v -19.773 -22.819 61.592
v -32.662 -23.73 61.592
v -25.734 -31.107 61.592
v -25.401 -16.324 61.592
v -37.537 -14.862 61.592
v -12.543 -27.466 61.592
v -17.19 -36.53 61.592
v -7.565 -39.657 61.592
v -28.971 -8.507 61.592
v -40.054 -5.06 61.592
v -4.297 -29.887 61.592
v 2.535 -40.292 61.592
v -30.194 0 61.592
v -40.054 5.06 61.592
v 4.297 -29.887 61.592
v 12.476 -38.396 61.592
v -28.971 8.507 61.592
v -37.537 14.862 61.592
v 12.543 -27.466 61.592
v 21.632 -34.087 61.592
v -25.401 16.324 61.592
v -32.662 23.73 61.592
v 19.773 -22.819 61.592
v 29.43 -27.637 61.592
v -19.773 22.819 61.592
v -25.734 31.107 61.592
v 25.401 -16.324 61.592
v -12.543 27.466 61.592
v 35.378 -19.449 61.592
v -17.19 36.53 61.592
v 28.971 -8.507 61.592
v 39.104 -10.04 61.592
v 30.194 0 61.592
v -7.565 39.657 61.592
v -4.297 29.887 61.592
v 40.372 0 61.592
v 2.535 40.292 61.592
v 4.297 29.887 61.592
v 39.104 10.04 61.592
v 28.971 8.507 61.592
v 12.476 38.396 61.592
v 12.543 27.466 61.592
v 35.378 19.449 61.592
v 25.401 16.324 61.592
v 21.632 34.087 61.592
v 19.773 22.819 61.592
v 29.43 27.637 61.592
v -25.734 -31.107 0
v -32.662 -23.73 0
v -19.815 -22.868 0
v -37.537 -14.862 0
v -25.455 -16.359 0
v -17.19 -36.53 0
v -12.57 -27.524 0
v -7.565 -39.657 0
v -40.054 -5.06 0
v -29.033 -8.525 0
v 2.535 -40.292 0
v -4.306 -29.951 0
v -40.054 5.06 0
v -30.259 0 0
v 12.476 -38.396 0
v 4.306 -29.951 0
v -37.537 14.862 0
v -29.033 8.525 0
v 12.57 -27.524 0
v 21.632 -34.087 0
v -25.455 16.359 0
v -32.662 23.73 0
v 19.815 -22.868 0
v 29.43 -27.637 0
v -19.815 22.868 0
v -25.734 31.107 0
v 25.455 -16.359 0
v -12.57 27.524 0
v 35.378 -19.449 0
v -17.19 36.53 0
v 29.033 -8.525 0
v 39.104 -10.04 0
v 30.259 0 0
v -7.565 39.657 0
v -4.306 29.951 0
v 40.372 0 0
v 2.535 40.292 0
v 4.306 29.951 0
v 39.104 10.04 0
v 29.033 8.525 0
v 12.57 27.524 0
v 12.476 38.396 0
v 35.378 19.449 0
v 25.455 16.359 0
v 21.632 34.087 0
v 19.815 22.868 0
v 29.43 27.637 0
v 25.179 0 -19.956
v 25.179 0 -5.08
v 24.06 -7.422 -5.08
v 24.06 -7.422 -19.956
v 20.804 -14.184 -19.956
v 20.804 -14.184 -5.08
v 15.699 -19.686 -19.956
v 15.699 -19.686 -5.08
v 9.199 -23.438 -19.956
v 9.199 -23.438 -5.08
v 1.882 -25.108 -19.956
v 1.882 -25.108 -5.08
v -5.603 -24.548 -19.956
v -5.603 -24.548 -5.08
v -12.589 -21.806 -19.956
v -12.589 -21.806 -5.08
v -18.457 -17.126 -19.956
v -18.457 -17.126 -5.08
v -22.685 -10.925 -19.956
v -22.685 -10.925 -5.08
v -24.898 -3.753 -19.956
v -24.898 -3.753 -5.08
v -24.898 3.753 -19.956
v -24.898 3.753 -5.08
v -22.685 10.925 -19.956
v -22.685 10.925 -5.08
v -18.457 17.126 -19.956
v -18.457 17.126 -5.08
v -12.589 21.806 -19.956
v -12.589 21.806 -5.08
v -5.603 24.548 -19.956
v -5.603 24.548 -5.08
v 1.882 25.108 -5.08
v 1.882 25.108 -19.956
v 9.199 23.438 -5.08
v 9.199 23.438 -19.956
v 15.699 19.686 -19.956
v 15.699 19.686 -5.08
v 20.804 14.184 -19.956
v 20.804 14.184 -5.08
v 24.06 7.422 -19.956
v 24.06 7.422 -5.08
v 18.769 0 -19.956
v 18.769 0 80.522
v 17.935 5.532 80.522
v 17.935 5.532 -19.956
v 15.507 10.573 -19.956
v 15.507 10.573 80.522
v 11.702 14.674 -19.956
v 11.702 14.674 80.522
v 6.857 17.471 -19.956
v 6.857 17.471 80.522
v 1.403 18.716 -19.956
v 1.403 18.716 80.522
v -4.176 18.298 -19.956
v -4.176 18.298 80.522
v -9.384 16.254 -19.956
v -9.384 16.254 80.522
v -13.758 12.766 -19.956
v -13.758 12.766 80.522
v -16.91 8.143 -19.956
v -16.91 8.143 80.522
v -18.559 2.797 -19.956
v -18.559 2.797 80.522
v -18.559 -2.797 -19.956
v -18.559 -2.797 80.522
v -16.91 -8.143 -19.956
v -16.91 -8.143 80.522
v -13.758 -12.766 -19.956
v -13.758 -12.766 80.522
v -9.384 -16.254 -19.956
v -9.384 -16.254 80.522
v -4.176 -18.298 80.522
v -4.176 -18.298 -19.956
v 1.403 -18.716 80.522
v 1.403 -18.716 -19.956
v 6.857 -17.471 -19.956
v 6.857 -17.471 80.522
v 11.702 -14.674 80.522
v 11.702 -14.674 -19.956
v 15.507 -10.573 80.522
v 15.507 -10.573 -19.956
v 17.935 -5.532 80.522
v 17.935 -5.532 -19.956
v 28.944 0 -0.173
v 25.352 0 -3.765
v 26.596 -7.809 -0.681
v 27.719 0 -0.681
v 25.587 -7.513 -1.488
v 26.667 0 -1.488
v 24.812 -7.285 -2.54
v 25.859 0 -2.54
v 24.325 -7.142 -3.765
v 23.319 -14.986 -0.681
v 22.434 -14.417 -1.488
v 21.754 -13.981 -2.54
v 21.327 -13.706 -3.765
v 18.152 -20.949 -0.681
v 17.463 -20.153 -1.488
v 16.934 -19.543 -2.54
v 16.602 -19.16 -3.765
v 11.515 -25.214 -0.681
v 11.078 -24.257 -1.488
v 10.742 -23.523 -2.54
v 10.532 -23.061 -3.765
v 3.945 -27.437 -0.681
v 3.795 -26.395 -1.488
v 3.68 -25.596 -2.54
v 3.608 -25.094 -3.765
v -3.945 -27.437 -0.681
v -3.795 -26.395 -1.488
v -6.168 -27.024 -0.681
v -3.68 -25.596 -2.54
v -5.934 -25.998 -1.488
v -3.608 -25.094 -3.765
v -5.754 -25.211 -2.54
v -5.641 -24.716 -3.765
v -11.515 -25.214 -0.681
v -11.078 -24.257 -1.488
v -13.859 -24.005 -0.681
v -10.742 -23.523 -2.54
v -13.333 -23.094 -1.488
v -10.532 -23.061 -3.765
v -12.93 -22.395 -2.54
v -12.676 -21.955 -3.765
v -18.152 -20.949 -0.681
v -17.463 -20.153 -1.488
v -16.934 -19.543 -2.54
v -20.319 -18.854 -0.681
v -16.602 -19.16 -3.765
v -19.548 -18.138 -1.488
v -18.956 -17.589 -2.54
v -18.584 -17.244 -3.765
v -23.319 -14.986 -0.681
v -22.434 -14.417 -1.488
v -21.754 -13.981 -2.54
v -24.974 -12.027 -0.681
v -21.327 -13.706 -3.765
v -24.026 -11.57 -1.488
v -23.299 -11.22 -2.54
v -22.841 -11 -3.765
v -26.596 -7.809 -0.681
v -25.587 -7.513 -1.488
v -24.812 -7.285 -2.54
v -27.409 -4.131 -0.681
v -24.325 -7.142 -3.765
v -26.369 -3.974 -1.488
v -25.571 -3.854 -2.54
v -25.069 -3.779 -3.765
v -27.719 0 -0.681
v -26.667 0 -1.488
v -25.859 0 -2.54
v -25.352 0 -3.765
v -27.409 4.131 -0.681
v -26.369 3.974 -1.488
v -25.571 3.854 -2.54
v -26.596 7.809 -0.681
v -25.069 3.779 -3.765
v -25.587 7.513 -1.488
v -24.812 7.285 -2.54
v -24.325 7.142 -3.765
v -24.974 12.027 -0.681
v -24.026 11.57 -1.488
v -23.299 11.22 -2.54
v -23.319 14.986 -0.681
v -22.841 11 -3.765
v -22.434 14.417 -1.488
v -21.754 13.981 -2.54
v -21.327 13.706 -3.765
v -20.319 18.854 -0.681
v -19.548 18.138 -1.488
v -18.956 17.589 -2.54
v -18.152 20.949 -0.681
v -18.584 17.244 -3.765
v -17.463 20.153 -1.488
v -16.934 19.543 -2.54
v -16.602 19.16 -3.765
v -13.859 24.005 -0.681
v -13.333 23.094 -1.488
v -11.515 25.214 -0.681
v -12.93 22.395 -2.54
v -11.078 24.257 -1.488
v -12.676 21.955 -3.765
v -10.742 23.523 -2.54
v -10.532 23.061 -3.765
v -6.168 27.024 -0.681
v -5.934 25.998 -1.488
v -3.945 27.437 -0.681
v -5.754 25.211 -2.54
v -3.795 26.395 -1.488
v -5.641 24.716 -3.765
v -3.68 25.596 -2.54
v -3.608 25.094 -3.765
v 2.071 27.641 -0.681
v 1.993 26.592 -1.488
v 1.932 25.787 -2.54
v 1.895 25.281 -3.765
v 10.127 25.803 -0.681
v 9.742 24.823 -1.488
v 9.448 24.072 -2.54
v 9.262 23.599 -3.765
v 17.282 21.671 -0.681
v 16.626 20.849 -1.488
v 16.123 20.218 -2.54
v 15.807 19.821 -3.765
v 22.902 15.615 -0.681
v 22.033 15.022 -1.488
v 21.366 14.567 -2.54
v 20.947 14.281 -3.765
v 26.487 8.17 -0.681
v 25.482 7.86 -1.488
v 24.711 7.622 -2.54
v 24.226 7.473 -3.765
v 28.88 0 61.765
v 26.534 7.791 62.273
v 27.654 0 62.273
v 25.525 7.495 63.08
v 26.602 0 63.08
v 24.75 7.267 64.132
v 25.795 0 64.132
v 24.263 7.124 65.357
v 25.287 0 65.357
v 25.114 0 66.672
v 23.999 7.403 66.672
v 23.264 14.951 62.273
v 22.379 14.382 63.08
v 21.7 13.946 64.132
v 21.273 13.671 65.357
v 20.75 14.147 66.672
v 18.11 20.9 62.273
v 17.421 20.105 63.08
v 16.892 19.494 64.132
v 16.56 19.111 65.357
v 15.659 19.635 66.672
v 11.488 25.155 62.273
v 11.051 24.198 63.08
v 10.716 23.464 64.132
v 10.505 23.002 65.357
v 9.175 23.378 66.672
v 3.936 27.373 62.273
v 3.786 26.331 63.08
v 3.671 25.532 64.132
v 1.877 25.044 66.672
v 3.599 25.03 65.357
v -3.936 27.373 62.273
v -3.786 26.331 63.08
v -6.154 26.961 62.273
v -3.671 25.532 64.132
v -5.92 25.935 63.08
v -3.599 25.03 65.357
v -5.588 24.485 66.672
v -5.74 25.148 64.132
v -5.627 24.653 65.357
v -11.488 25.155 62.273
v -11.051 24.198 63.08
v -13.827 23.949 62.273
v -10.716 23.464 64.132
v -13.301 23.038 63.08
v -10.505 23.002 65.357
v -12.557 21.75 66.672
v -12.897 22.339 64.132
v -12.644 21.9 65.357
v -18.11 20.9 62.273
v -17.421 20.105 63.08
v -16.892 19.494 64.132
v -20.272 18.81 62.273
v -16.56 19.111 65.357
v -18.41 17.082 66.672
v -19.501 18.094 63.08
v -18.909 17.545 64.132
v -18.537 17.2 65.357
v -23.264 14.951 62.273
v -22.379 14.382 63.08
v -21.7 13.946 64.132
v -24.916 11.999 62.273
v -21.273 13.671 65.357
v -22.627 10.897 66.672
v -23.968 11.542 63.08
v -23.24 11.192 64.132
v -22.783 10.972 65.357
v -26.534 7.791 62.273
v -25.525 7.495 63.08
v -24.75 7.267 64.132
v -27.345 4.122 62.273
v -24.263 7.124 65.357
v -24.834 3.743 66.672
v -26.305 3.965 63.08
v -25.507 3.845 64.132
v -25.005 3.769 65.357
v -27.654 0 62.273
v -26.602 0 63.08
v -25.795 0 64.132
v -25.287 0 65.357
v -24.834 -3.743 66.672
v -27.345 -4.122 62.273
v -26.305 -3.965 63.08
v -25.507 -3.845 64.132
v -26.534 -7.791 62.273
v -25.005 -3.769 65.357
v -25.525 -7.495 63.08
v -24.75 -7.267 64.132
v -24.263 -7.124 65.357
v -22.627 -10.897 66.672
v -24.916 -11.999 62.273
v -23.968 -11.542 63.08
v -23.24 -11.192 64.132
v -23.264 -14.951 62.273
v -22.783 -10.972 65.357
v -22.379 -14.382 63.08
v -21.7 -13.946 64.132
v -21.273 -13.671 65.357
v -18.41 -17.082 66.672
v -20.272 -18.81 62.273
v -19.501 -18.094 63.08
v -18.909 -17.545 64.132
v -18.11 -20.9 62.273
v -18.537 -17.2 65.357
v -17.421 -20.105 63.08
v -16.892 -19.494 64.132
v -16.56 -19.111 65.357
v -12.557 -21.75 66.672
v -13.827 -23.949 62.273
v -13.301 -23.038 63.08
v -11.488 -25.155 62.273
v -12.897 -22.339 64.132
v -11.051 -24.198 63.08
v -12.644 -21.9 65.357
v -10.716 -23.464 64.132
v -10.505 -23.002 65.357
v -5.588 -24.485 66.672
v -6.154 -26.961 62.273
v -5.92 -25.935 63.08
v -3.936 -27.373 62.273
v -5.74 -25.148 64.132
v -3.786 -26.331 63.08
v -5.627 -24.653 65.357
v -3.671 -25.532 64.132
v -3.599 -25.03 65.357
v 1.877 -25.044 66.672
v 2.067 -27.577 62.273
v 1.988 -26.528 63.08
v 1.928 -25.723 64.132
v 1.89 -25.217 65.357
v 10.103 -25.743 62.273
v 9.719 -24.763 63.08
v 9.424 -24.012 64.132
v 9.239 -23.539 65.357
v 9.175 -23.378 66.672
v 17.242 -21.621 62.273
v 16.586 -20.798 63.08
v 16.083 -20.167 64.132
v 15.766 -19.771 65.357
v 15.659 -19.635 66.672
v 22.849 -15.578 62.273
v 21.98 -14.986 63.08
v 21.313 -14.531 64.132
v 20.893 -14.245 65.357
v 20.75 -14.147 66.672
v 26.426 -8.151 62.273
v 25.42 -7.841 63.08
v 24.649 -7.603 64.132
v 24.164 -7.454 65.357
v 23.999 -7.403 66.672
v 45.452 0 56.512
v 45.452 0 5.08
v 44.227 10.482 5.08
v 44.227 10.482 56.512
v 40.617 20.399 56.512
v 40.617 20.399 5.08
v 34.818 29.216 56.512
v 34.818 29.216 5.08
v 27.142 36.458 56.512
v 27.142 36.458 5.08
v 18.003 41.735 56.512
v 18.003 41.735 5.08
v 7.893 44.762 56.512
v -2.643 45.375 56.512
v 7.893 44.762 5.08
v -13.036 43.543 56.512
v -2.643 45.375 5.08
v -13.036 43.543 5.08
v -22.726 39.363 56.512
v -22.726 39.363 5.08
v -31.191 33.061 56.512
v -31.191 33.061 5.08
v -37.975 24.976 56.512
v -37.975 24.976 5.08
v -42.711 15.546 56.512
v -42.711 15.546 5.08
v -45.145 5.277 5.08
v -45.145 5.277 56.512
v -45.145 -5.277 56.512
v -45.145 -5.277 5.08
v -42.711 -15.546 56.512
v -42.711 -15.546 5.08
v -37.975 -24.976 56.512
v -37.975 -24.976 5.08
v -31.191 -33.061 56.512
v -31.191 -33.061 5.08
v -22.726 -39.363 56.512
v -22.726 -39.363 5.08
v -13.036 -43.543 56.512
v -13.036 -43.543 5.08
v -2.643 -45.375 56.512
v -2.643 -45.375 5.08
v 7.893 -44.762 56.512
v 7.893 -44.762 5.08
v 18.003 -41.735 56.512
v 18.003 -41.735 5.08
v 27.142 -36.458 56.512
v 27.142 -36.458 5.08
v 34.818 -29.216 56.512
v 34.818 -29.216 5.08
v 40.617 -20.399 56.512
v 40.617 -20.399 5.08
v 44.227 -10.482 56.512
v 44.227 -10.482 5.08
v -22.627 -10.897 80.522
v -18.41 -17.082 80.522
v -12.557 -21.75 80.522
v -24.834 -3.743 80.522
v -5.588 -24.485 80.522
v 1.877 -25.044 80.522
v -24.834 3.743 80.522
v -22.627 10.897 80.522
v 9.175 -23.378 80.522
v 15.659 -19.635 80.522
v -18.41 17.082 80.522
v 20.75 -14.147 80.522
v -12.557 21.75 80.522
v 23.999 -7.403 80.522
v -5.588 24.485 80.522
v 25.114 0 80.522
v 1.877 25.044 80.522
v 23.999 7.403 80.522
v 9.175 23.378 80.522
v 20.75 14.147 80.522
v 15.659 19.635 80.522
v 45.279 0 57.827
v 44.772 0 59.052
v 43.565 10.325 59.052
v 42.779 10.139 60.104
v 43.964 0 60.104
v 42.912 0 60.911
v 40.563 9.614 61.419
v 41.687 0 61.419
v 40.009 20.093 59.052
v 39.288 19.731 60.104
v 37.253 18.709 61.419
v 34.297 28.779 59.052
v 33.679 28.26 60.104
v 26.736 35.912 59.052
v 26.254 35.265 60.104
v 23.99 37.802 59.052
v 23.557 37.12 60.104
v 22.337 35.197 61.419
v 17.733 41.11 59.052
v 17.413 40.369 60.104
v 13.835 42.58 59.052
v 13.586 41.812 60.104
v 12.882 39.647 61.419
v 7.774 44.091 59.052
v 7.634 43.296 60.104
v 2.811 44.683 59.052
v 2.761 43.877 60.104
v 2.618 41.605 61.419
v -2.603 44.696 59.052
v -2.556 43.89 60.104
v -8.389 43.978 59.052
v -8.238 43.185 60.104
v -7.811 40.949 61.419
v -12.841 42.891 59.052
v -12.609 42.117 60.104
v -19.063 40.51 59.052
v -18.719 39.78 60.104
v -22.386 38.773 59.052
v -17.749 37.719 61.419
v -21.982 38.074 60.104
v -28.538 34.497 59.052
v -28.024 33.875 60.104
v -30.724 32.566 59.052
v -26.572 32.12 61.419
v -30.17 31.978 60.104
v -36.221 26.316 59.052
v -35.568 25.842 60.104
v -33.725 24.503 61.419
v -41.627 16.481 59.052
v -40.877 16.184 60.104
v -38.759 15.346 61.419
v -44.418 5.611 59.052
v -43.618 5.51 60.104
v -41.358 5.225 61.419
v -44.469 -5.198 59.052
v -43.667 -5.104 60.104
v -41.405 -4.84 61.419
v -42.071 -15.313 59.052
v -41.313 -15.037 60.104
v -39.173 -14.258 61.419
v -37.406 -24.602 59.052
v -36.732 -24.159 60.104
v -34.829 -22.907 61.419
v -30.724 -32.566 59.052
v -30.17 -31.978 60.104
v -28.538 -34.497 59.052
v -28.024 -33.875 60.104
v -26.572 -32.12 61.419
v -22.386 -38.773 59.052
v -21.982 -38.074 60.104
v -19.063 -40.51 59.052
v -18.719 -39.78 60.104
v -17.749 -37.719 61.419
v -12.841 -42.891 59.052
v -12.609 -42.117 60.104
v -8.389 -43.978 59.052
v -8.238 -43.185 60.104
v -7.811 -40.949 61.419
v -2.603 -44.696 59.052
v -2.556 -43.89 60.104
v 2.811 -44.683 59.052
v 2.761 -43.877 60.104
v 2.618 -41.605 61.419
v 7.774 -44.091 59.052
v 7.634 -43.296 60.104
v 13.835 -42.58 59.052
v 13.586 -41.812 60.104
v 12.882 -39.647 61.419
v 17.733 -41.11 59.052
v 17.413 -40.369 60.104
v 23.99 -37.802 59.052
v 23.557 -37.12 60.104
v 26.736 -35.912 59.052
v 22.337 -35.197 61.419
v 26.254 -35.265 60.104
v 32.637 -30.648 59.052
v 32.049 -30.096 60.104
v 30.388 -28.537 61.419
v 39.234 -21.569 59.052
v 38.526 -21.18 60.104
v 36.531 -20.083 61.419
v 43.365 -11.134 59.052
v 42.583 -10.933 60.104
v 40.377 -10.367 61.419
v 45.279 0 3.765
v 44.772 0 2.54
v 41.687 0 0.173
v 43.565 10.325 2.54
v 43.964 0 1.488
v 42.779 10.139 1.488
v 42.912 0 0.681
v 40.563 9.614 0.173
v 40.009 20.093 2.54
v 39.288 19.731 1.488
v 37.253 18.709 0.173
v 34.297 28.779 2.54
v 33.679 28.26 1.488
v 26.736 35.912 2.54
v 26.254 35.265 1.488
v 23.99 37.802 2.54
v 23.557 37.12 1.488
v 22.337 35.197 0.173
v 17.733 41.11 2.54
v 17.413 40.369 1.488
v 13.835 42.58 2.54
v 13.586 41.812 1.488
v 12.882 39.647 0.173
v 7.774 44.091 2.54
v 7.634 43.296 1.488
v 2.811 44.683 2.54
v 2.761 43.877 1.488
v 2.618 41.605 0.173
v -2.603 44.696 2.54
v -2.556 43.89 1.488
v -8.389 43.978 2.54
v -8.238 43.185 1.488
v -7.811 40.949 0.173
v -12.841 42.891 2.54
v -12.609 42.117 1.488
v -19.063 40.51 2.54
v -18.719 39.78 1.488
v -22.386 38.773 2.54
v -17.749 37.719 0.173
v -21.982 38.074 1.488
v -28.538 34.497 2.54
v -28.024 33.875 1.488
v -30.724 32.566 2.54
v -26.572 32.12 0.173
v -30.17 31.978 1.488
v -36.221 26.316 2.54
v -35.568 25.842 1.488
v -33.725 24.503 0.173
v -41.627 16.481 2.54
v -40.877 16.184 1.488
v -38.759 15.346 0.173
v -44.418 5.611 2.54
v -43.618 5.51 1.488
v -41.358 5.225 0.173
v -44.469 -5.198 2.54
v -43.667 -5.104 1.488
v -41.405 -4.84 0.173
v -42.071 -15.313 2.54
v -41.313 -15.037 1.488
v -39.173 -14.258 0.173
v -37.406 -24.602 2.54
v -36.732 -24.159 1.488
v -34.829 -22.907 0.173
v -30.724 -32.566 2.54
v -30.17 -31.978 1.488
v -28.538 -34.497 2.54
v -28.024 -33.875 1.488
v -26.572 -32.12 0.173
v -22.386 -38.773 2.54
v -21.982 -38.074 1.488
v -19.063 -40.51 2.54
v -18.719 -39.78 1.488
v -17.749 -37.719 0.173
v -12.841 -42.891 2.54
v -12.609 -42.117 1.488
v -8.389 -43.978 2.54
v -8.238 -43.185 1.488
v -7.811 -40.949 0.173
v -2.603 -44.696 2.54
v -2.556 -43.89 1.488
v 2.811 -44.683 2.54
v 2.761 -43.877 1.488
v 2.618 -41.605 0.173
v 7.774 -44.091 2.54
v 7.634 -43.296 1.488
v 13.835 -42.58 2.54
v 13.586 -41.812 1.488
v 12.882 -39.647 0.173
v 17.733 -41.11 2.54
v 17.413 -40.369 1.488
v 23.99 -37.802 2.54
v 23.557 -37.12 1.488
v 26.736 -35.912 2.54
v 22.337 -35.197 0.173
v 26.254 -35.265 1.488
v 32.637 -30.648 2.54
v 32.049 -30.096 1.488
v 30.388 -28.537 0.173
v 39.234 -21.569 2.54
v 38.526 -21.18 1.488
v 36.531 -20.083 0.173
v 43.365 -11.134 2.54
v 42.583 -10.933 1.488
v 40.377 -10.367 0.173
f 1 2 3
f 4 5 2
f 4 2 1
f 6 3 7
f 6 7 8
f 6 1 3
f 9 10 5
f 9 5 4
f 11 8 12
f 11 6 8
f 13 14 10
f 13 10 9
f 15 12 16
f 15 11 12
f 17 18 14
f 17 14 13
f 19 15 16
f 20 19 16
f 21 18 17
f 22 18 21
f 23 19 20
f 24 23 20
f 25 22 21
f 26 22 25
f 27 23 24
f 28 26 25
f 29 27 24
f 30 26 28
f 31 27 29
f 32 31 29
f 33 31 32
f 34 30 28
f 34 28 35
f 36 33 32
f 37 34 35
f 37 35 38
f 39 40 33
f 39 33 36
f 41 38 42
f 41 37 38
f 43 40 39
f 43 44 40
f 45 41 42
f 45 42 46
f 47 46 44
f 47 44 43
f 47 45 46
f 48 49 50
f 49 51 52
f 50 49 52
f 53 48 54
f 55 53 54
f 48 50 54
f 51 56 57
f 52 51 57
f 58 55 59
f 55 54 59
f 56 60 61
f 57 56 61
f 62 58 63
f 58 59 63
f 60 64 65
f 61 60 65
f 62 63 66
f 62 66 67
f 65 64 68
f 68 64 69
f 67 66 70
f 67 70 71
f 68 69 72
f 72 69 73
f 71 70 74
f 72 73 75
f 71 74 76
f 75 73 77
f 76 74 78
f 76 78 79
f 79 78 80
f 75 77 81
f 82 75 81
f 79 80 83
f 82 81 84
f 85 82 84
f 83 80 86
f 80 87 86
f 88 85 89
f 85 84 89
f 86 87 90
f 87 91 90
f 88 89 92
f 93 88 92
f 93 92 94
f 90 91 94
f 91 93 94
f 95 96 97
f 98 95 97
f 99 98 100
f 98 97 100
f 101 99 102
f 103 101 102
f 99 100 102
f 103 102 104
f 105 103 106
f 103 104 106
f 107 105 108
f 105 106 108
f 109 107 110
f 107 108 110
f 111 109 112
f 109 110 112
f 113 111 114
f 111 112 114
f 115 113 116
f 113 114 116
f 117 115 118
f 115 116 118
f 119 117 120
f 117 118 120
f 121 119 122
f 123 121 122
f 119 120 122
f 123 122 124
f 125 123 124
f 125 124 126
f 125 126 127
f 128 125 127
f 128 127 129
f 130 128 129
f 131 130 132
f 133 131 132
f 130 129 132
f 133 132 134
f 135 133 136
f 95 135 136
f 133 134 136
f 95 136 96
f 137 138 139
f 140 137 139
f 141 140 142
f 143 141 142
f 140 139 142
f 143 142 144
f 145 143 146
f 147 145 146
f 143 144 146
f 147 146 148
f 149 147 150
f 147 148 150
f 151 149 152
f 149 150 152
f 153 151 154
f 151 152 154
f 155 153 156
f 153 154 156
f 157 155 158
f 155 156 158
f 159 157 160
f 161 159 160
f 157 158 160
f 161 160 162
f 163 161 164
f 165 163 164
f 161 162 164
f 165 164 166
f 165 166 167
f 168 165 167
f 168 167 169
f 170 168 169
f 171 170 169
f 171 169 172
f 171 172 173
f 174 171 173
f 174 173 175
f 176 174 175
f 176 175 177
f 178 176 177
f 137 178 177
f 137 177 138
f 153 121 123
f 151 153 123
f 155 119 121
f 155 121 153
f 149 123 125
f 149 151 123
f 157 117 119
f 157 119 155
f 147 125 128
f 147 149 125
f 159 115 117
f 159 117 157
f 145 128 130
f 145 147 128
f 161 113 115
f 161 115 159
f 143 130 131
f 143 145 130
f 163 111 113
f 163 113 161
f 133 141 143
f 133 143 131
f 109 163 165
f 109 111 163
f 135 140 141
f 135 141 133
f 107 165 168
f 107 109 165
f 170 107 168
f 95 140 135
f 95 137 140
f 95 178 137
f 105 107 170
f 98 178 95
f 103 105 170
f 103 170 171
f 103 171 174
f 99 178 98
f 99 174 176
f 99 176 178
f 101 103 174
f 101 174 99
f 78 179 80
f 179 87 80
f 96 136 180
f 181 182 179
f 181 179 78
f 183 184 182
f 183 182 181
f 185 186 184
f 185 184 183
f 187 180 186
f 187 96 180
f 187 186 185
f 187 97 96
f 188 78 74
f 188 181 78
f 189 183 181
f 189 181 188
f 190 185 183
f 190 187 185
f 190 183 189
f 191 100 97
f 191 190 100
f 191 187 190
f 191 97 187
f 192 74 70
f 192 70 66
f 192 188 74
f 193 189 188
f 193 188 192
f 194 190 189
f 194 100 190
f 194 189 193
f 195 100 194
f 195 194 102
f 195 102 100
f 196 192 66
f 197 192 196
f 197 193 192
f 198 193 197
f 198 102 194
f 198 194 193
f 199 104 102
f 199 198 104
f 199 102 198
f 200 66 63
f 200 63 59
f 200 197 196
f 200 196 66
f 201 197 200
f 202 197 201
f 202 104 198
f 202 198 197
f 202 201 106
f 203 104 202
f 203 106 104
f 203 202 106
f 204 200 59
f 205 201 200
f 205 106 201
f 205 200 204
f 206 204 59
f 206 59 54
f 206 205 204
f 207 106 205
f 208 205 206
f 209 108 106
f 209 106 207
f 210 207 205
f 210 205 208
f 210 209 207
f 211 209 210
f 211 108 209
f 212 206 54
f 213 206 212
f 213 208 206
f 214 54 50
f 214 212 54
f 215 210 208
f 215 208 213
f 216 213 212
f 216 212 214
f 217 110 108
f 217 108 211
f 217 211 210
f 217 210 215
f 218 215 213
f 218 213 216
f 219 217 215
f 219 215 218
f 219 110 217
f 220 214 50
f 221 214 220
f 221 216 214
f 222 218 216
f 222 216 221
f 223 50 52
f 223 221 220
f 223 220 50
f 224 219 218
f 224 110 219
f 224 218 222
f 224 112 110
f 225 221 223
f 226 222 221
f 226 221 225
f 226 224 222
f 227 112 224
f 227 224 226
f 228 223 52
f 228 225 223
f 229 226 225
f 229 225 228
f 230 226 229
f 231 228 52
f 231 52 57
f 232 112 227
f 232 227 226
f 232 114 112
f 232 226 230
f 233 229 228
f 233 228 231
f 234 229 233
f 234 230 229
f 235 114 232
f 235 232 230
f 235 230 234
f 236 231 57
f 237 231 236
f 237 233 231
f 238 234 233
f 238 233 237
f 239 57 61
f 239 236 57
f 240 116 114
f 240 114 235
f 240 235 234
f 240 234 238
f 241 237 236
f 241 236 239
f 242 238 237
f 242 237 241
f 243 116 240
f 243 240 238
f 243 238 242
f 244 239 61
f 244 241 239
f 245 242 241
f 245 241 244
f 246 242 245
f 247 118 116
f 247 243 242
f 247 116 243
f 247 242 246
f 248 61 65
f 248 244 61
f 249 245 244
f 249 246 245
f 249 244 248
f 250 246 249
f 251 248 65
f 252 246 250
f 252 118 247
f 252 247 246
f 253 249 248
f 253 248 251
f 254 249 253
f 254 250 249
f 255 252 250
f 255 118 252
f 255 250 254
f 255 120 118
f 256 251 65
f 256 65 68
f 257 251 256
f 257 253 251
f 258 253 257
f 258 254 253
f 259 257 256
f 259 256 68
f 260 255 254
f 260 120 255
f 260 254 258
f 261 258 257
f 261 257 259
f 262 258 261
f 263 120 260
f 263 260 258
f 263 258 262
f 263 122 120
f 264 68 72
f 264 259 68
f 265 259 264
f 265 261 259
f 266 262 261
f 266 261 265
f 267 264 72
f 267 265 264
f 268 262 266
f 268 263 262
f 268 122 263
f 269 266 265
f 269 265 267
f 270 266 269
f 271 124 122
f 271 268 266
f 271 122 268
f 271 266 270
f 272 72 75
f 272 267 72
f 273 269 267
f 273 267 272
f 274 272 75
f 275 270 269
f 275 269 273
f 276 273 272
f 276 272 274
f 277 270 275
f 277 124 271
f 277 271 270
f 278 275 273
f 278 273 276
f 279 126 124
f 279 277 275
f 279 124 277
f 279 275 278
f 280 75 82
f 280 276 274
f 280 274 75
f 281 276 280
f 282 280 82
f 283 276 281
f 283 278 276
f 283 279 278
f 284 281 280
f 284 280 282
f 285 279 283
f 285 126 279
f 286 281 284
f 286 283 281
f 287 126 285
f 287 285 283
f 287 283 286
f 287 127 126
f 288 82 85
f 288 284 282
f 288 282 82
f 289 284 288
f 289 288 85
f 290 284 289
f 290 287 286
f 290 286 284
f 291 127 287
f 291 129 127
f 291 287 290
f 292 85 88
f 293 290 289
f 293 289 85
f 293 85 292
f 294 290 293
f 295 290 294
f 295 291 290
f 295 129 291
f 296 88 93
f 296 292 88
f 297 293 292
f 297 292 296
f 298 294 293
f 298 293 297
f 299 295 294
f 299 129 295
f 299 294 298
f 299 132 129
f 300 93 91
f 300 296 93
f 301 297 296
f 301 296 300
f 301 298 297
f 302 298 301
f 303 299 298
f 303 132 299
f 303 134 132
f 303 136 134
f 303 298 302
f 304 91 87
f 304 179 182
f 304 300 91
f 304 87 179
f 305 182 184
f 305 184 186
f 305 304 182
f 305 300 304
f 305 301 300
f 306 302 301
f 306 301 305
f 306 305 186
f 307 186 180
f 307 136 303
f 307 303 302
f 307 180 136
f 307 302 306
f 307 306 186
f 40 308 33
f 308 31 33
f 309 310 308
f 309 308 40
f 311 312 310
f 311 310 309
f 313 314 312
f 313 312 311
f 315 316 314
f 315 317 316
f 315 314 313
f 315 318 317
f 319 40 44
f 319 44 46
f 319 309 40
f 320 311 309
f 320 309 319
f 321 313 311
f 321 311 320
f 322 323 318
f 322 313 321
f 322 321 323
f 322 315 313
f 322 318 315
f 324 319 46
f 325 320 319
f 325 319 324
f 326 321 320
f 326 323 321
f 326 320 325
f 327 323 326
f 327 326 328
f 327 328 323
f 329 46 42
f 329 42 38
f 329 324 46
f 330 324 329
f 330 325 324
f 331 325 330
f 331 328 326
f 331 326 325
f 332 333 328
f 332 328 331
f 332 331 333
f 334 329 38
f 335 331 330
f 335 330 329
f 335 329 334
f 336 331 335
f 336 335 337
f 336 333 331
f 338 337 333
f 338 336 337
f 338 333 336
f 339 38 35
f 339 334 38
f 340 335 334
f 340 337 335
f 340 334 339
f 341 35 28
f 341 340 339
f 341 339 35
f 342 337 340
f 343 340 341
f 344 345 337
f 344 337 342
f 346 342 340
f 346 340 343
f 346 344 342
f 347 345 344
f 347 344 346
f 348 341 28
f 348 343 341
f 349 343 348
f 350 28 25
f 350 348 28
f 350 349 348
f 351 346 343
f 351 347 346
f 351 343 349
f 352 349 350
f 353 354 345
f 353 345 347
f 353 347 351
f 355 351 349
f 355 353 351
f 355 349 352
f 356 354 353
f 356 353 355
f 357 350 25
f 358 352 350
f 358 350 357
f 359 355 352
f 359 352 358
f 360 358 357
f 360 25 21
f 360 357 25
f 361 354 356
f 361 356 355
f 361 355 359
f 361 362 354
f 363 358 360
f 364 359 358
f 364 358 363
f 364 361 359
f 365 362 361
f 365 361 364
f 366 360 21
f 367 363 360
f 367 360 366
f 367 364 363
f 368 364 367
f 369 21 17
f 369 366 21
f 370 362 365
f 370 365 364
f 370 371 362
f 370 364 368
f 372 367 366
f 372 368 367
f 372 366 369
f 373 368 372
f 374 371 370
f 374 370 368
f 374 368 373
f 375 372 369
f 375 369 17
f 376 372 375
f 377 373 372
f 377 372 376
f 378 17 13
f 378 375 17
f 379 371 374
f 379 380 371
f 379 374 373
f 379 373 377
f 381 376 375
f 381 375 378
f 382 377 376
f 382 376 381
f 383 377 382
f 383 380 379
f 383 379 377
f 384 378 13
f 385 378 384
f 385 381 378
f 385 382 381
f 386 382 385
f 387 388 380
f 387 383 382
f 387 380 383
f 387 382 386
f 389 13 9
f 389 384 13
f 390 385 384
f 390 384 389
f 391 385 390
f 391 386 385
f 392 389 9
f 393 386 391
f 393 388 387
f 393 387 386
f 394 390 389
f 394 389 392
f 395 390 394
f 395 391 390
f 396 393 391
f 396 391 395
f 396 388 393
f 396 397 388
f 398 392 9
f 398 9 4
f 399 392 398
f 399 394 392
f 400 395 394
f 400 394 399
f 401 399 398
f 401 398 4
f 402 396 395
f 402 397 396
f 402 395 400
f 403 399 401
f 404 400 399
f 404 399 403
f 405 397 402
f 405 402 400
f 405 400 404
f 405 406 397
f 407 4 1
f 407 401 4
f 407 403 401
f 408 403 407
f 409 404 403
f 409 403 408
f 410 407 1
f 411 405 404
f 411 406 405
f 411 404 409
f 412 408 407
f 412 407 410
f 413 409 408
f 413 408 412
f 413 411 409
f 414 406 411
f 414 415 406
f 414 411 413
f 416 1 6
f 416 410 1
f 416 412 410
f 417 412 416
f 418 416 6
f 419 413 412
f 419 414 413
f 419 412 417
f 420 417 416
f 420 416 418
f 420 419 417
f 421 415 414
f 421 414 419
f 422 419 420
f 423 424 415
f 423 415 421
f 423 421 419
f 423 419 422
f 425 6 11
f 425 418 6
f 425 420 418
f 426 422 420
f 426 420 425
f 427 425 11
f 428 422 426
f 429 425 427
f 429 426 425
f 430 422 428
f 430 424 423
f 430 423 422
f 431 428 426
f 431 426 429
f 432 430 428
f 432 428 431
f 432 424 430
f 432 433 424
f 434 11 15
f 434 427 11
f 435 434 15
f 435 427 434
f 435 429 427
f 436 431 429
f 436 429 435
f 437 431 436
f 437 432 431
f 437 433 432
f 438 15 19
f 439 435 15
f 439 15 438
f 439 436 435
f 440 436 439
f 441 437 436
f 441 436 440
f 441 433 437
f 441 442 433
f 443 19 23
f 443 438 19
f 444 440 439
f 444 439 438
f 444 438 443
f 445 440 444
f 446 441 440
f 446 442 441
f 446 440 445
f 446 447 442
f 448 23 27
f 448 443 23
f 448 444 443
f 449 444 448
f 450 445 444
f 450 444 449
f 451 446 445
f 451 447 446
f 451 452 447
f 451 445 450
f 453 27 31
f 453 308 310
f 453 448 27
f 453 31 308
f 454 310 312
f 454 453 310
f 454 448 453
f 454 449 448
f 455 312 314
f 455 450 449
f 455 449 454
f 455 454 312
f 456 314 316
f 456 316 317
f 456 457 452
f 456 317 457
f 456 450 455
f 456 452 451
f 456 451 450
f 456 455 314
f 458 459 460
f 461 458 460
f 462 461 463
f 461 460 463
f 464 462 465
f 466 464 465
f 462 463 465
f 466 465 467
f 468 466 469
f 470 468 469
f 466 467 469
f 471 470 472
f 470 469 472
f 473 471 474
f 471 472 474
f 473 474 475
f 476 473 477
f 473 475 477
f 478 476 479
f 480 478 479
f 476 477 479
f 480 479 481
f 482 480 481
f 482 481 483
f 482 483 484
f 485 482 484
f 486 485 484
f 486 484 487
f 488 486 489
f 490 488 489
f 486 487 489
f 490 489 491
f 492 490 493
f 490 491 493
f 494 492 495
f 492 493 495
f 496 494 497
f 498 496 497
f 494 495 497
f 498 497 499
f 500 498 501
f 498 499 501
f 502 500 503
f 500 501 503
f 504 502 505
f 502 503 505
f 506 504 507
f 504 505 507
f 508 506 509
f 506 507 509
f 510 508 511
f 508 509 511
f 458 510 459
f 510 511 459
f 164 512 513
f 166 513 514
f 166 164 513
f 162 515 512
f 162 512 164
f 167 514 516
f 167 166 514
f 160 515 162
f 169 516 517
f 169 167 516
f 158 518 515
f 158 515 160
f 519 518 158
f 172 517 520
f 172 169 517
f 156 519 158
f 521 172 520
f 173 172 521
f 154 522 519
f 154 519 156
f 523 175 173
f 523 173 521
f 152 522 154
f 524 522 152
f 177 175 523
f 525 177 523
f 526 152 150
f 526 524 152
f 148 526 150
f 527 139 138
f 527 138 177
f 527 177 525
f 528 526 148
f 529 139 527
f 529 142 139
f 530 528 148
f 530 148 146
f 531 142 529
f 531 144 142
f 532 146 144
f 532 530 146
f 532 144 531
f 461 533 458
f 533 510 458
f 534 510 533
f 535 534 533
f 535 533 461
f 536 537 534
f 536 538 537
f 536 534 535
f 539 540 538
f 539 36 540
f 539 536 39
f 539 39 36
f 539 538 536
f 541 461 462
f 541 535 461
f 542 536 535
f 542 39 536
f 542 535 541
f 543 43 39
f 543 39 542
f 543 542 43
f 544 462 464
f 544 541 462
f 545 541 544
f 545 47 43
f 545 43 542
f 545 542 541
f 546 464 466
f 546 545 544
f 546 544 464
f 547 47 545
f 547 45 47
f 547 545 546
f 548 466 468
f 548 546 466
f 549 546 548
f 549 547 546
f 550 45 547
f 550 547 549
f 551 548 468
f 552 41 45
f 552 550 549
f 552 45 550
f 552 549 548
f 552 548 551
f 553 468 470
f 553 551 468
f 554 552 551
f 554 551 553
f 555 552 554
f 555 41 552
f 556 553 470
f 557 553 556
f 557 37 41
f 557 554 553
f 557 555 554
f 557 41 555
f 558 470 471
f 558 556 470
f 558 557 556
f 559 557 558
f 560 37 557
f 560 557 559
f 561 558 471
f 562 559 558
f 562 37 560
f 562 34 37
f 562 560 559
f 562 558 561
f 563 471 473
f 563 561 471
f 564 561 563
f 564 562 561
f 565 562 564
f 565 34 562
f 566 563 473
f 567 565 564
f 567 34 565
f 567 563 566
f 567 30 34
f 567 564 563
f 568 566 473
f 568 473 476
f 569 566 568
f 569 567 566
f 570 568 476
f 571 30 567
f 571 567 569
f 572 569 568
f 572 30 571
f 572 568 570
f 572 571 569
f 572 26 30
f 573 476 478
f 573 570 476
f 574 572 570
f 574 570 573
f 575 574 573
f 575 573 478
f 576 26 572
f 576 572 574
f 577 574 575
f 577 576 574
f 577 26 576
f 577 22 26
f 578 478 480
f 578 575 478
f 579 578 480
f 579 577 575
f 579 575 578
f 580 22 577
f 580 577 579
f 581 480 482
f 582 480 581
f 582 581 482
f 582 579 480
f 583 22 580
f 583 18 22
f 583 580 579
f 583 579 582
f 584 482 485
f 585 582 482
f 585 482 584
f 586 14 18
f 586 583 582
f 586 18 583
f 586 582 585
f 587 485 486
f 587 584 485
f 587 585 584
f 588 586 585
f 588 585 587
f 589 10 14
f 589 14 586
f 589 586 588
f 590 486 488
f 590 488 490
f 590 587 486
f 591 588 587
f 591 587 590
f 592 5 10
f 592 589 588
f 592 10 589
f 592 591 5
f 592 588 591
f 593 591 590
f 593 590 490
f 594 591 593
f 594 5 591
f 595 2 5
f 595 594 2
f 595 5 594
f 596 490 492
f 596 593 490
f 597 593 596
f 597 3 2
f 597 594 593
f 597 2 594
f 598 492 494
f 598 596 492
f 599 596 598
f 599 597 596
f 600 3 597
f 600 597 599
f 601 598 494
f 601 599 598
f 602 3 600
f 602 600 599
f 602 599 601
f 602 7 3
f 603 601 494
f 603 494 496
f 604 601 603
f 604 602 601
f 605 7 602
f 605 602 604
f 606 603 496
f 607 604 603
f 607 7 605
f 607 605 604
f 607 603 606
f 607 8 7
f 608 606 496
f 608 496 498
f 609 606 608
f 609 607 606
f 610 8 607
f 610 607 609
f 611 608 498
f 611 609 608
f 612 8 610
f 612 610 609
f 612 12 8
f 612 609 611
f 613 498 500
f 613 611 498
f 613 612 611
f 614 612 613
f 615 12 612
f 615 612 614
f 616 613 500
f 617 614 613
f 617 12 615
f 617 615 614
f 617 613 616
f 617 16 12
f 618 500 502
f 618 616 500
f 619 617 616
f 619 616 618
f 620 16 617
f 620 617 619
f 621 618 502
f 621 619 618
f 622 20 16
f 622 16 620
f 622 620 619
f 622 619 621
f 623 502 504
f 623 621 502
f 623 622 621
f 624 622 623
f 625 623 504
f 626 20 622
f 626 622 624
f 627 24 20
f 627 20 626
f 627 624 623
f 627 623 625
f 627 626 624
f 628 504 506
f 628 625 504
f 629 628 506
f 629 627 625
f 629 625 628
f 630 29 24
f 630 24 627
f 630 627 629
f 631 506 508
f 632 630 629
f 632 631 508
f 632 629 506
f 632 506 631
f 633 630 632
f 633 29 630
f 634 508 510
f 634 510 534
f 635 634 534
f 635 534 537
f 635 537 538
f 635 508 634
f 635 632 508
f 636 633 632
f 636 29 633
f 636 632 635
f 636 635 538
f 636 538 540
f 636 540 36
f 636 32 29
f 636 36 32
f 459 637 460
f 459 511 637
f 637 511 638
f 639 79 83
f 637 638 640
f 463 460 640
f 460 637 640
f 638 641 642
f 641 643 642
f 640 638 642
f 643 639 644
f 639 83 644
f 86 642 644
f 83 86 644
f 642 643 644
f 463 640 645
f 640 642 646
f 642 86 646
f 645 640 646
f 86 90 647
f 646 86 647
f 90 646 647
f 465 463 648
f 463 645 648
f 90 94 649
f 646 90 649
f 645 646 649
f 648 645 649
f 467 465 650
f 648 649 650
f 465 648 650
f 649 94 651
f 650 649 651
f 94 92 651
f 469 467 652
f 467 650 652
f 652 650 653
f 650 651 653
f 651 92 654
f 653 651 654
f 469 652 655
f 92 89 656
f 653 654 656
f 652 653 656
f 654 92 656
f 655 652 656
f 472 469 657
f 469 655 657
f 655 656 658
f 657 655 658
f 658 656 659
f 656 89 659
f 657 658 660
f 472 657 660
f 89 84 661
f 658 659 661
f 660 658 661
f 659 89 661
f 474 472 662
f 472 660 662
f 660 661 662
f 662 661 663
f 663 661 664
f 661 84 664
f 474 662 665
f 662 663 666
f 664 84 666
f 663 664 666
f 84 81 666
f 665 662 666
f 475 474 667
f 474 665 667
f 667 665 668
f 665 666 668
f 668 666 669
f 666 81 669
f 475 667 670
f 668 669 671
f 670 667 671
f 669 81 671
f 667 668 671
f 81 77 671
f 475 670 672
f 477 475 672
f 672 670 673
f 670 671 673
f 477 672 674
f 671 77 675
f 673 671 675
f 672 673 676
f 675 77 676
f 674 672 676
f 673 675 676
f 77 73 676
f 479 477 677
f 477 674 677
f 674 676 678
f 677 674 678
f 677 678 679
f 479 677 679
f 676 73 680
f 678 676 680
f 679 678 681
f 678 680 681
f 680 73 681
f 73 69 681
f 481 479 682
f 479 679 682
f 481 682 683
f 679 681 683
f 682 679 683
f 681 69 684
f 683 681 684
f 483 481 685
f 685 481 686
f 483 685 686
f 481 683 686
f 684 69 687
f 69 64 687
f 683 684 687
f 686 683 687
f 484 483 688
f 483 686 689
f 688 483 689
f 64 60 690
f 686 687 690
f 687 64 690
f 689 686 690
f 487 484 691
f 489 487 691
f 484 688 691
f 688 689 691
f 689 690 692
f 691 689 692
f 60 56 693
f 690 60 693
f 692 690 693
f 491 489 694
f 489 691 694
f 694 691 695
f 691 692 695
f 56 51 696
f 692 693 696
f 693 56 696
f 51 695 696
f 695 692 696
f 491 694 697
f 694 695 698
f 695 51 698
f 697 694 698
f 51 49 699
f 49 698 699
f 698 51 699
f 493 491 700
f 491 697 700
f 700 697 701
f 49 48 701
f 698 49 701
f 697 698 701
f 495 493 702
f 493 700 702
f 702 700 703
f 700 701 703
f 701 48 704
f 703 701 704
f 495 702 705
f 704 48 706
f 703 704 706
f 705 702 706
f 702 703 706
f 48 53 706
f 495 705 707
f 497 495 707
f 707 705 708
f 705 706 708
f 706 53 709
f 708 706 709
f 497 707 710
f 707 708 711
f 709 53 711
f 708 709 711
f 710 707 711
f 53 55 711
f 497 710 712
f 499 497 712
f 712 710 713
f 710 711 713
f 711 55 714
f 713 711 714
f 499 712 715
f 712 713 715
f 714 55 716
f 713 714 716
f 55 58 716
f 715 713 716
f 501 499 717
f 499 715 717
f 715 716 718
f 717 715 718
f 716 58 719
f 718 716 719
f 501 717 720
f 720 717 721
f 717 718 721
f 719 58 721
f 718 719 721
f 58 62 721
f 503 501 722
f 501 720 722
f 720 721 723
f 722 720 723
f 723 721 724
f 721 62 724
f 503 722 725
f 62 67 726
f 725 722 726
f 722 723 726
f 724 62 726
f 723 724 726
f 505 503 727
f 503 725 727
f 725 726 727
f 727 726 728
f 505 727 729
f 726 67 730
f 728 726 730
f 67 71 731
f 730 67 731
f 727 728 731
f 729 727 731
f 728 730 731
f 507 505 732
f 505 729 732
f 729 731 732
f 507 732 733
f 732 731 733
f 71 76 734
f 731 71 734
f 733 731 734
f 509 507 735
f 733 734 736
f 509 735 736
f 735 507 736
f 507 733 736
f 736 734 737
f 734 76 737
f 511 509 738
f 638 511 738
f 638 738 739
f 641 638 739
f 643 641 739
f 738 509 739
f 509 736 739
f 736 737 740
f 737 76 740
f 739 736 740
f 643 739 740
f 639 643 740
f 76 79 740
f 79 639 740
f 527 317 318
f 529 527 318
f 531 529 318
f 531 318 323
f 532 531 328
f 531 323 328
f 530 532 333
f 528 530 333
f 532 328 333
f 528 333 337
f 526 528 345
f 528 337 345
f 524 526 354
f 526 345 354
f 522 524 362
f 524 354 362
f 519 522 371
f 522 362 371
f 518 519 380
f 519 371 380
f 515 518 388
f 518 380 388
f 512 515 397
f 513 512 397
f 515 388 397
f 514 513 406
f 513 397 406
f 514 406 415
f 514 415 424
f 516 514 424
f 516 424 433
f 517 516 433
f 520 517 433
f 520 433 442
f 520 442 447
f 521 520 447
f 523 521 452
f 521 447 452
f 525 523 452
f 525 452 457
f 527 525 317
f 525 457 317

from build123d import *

# Parameters (mm, degrees)
F0_R       = 45.4520962522
F1_DEPTH   = 61.59209
F2_R       = 25.1143263765
F1_FACE1_R = 45.4520962522
F3_DEPTH   = 18.93017
F4_R       = 25.1788729995
F5_DEPTH   = 19.9562
F6_R       = 5.08
F7_R       = 18.7687787906
F8_DEPTH   = 284.89901


with BuildPart() as f1:
    # F0 (on Top) → F1 (new body)
    with BuildSketch(Plane.XY):
        Circle(F0_R)
    extrude(amount=F1_DEPTH)

    # F2 (on face) + F1_face1 (on face) → F3 (join)
    with BuildSketch(Plane.XY.offset(61.59209)):
        Circle(F2_R)
    with BuildSketch(Plane(origin=(0, 0, 0), x_dir=(1, 0, 0), z_dir=(0, 0, -1))):
        Circle(F1_FACE1_R)
    extrude(amount=F3_DEPTH, dir=(0, 0, 1))

    # F4 (on face) → F5 (join)
    with BuildSketch(Plane(origin=(0, 0, 0), x_dir=(1, 0, 0), z_dir=(0, 0, -1))):
        Circle(F4_R)
    extrude(amount=F5_DEPTH)

    # F6
    f6_edges = [f1.edges().sort_by_distance(p)[0] for p in [
        (-45.452096, 0, 0),
        (45.452096, 0, 30.796045),
        (-45.452096, 0, 61.59209),
        (-25.114326, 0, 61.59209),
        (-25.178873, 0, 0),
    ]]
    fillet(f6_edges, radius=F6_R)

    # F7 (on face) → F8 (cut)
    with BuildSketch(Plane.XY.offset(80.52226)):
        Circle(F7_R)
    extrude(amount=-F8_DEPTH, mode=Mode.SUBTRACT)


solid = f1.part
